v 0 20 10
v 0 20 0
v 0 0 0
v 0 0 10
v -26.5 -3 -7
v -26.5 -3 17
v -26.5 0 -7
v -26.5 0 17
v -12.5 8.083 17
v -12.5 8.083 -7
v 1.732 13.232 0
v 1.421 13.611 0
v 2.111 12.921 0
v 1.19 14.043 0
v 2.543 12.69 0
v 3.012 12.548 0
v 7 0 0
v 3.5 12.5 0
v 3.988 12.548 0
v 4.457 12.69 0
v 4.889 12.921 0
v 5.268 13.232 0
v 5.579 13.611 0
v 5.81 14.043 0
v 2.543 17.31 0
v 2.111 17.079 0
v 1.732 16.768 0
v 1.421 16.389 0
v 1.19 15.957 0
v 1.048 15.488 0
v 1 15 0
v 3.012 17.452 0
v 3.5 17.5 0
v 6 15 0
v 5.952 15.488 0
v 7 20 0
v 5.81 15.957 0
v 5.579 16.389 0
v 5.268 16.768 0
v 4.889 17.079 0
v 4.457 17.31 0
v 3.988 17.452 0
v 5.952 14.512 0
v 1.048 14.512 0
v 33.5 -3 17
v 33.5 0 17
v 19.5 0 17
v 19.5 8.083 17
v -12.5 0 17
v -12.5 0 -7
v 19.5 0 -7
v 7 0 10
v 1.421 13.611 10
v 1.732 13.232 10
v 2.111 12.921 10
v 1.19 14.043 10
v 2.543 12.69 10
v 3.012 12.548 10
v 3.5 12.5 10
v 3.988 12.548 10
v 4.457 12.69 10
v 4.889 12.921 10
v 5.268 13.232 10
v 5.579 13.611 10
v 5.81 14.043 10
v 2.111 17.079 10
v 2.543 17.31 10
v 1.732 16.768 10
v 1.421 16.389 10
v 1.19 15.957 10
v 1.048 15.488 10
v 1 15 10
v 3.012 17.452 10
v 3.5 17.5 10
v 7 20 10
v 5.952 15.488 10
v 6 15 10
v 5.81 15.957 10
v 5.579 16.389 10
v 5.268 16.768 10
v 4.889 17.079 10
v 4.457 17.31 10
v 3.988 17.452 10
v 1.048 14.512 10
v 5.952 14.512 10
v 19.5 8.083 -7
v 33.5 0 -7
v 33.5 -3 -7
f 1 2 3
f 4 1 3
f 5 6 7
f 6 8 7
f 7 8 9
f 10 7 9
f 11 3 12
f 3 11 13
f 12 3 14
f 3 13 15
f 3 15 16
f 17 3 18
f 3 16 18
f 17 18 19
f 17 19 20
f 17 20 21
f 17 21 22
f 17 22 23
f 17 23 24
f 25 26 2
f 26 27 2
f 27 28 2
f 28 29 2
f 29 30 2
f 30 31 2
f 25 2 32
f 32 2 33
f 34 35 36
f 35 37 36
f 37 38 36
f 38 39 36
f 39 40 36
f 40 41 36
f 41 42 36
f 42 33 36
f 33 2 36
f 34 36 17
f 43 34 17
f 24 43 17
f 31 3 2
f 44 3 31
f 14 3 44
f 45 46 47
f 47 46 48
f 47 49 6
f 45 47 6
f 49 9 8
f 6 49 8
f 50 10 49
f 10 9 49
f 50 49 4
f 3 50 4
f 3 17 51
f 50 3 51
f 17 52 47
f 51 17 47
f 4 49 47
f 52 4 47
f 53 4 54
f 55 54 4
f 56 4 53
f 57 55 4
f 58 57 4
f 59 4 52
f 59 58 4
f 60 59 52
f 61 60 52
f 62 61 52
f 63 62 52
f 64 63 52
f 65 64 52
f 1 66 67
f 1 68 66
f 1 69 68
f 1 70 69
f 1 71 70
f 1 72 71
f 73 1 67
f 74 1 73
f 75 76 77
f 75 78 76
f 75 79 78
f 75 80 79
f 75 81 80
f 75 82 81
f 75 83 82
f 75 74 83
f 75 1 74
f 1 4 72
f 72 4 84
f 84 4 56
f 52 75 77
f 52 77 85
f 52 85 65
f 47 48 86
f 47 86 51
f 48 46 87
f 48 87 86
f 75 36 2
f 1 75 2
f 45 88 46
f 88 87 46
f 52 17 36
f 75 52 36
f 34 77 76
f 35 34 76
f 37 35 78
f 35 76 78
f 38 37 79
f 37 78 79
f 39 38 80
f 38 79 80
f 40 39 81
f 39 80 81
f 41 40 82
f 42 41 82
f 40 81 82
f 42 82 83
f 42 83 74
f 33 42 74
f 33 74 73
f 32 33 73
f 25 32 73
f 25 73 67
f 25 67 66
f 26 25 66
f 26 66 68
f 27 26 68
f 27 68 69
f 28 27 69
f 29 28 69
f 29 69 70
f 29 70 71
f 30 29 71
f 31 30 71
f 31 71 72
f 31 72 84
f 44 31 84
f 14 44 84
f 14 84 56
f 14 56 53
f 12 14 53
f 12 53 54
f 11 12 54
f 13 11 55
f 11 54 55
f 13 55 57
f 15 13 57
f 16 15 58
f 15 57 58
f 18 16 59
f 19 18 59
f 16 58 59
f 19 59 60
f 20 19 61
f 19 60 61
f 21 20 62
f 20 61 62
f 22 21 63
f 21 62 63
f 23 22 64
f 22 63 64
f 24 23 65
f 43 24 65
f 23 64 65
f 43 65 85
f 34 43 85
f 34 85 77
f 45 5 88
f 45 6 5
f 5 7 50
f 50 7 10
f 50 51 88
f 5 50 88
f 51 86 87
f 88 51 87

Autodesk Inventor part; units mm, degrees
ref_plane "YZ Plane" through (0, 0, 0) normal (1, 0, 0) x (0, 1, 0)
ref_plane "XZ Plane" through (0, 0, 0) normal (0, 1, 0) x (-1, 0, 0)
ref_plane "XY Plane" through (0, 0, 0) normal (0, 0, 1) x (1, 0, 0)
sketch "スケッチ1" plane through (0, 0, 0) normal (0, 0, 1) x (1, 0, 0)
  line L0 (0, 0) -> (7, 0)
  line L1 (7, 0) -> (7, 20)
  line L2 (7, 20) -> (0, 20)
  line L3 (0, 20) -> (0, 0)
  dimension "d0" = 20
  dimension "d1" = 7
extrude "押し出し1" add sketch "スケッチ1" along normal blind 10
sketch "スケッチ2" plane through (0, 0, 10) normal (0, 0, 1) x (1, 0, 0)
  circle A0 centre (3.5, 15) radius 2.5
  line L0 (0, 0) -> (7, 0) projected
  line L1 (0, 20) -> (0, 0) projected
  line L2 (7, 20) -> (0, 20) projected
  dimension "d4" = 5
  dimension "d6" = 3.5
  dimension "d15" = 5
extrude "押し出し2" cut sketch "スケッチ2" against normal blind 10
sketch "スケッチ3" plane through (0, 0, 0) normal (0, -1, 0) x (1, 0, 0)
  line L0 (33.5, 17) -> (-26.5, 17)
  line L1 (-26.5, 17) -> (-26.5, -7)
  line L2 (-26.5, -7) -> (33.5, -7)
  line L3 (33.5, -7) -> (33.5, 17)
  line L4 (7, 0) -> (0, 0) projected
  line L5 (3.5, 0) -> (3.5, 10)
  line L6 (0, 10) -> (7, 10) projected
  line L7 (7, 0) -> (7, 10) projected
  line L8 (7, 5) -> (0, 5)
  dimension "d9" = 12
  dimension "d10" = 12
  dimension "d11" = 30
  dimension "d12" = 30
extrude "押し出し3" add sketch "スケッチ3" along normal blind 3 contours L3 L2 L1 L0 | L4 L5 L8 L7 | L8 L5 L6 L7
sketch "スケッチ4" plane through (-26.5, 0, 17) normal (0, 0, 1) x (1, 0, 0)
  line L0 (60, 0) -> (0, 0) projected
  line L1 (0, 0) -> (14, 8.0829)
  line L2 (14, 8.0829) -> (14, 0)
  line L3 (60, 0) -> (46, 8.0829)
  line L4 (46, 8.0829) -> (46, 0)
  point P0 (26.5, 0)
  dimension "d16" = 60
  dimension "d17" = 60
  dimension "d22" = 14
  dimension "d23" = 14
extrude "押し出し4" add sketch "スケッチ4" against normal blind 24
equation "\"d9\" = d10"
equation "\"d11\" = d12"
equation "\"d17\" = d16"
properties part number "sole_practice"
